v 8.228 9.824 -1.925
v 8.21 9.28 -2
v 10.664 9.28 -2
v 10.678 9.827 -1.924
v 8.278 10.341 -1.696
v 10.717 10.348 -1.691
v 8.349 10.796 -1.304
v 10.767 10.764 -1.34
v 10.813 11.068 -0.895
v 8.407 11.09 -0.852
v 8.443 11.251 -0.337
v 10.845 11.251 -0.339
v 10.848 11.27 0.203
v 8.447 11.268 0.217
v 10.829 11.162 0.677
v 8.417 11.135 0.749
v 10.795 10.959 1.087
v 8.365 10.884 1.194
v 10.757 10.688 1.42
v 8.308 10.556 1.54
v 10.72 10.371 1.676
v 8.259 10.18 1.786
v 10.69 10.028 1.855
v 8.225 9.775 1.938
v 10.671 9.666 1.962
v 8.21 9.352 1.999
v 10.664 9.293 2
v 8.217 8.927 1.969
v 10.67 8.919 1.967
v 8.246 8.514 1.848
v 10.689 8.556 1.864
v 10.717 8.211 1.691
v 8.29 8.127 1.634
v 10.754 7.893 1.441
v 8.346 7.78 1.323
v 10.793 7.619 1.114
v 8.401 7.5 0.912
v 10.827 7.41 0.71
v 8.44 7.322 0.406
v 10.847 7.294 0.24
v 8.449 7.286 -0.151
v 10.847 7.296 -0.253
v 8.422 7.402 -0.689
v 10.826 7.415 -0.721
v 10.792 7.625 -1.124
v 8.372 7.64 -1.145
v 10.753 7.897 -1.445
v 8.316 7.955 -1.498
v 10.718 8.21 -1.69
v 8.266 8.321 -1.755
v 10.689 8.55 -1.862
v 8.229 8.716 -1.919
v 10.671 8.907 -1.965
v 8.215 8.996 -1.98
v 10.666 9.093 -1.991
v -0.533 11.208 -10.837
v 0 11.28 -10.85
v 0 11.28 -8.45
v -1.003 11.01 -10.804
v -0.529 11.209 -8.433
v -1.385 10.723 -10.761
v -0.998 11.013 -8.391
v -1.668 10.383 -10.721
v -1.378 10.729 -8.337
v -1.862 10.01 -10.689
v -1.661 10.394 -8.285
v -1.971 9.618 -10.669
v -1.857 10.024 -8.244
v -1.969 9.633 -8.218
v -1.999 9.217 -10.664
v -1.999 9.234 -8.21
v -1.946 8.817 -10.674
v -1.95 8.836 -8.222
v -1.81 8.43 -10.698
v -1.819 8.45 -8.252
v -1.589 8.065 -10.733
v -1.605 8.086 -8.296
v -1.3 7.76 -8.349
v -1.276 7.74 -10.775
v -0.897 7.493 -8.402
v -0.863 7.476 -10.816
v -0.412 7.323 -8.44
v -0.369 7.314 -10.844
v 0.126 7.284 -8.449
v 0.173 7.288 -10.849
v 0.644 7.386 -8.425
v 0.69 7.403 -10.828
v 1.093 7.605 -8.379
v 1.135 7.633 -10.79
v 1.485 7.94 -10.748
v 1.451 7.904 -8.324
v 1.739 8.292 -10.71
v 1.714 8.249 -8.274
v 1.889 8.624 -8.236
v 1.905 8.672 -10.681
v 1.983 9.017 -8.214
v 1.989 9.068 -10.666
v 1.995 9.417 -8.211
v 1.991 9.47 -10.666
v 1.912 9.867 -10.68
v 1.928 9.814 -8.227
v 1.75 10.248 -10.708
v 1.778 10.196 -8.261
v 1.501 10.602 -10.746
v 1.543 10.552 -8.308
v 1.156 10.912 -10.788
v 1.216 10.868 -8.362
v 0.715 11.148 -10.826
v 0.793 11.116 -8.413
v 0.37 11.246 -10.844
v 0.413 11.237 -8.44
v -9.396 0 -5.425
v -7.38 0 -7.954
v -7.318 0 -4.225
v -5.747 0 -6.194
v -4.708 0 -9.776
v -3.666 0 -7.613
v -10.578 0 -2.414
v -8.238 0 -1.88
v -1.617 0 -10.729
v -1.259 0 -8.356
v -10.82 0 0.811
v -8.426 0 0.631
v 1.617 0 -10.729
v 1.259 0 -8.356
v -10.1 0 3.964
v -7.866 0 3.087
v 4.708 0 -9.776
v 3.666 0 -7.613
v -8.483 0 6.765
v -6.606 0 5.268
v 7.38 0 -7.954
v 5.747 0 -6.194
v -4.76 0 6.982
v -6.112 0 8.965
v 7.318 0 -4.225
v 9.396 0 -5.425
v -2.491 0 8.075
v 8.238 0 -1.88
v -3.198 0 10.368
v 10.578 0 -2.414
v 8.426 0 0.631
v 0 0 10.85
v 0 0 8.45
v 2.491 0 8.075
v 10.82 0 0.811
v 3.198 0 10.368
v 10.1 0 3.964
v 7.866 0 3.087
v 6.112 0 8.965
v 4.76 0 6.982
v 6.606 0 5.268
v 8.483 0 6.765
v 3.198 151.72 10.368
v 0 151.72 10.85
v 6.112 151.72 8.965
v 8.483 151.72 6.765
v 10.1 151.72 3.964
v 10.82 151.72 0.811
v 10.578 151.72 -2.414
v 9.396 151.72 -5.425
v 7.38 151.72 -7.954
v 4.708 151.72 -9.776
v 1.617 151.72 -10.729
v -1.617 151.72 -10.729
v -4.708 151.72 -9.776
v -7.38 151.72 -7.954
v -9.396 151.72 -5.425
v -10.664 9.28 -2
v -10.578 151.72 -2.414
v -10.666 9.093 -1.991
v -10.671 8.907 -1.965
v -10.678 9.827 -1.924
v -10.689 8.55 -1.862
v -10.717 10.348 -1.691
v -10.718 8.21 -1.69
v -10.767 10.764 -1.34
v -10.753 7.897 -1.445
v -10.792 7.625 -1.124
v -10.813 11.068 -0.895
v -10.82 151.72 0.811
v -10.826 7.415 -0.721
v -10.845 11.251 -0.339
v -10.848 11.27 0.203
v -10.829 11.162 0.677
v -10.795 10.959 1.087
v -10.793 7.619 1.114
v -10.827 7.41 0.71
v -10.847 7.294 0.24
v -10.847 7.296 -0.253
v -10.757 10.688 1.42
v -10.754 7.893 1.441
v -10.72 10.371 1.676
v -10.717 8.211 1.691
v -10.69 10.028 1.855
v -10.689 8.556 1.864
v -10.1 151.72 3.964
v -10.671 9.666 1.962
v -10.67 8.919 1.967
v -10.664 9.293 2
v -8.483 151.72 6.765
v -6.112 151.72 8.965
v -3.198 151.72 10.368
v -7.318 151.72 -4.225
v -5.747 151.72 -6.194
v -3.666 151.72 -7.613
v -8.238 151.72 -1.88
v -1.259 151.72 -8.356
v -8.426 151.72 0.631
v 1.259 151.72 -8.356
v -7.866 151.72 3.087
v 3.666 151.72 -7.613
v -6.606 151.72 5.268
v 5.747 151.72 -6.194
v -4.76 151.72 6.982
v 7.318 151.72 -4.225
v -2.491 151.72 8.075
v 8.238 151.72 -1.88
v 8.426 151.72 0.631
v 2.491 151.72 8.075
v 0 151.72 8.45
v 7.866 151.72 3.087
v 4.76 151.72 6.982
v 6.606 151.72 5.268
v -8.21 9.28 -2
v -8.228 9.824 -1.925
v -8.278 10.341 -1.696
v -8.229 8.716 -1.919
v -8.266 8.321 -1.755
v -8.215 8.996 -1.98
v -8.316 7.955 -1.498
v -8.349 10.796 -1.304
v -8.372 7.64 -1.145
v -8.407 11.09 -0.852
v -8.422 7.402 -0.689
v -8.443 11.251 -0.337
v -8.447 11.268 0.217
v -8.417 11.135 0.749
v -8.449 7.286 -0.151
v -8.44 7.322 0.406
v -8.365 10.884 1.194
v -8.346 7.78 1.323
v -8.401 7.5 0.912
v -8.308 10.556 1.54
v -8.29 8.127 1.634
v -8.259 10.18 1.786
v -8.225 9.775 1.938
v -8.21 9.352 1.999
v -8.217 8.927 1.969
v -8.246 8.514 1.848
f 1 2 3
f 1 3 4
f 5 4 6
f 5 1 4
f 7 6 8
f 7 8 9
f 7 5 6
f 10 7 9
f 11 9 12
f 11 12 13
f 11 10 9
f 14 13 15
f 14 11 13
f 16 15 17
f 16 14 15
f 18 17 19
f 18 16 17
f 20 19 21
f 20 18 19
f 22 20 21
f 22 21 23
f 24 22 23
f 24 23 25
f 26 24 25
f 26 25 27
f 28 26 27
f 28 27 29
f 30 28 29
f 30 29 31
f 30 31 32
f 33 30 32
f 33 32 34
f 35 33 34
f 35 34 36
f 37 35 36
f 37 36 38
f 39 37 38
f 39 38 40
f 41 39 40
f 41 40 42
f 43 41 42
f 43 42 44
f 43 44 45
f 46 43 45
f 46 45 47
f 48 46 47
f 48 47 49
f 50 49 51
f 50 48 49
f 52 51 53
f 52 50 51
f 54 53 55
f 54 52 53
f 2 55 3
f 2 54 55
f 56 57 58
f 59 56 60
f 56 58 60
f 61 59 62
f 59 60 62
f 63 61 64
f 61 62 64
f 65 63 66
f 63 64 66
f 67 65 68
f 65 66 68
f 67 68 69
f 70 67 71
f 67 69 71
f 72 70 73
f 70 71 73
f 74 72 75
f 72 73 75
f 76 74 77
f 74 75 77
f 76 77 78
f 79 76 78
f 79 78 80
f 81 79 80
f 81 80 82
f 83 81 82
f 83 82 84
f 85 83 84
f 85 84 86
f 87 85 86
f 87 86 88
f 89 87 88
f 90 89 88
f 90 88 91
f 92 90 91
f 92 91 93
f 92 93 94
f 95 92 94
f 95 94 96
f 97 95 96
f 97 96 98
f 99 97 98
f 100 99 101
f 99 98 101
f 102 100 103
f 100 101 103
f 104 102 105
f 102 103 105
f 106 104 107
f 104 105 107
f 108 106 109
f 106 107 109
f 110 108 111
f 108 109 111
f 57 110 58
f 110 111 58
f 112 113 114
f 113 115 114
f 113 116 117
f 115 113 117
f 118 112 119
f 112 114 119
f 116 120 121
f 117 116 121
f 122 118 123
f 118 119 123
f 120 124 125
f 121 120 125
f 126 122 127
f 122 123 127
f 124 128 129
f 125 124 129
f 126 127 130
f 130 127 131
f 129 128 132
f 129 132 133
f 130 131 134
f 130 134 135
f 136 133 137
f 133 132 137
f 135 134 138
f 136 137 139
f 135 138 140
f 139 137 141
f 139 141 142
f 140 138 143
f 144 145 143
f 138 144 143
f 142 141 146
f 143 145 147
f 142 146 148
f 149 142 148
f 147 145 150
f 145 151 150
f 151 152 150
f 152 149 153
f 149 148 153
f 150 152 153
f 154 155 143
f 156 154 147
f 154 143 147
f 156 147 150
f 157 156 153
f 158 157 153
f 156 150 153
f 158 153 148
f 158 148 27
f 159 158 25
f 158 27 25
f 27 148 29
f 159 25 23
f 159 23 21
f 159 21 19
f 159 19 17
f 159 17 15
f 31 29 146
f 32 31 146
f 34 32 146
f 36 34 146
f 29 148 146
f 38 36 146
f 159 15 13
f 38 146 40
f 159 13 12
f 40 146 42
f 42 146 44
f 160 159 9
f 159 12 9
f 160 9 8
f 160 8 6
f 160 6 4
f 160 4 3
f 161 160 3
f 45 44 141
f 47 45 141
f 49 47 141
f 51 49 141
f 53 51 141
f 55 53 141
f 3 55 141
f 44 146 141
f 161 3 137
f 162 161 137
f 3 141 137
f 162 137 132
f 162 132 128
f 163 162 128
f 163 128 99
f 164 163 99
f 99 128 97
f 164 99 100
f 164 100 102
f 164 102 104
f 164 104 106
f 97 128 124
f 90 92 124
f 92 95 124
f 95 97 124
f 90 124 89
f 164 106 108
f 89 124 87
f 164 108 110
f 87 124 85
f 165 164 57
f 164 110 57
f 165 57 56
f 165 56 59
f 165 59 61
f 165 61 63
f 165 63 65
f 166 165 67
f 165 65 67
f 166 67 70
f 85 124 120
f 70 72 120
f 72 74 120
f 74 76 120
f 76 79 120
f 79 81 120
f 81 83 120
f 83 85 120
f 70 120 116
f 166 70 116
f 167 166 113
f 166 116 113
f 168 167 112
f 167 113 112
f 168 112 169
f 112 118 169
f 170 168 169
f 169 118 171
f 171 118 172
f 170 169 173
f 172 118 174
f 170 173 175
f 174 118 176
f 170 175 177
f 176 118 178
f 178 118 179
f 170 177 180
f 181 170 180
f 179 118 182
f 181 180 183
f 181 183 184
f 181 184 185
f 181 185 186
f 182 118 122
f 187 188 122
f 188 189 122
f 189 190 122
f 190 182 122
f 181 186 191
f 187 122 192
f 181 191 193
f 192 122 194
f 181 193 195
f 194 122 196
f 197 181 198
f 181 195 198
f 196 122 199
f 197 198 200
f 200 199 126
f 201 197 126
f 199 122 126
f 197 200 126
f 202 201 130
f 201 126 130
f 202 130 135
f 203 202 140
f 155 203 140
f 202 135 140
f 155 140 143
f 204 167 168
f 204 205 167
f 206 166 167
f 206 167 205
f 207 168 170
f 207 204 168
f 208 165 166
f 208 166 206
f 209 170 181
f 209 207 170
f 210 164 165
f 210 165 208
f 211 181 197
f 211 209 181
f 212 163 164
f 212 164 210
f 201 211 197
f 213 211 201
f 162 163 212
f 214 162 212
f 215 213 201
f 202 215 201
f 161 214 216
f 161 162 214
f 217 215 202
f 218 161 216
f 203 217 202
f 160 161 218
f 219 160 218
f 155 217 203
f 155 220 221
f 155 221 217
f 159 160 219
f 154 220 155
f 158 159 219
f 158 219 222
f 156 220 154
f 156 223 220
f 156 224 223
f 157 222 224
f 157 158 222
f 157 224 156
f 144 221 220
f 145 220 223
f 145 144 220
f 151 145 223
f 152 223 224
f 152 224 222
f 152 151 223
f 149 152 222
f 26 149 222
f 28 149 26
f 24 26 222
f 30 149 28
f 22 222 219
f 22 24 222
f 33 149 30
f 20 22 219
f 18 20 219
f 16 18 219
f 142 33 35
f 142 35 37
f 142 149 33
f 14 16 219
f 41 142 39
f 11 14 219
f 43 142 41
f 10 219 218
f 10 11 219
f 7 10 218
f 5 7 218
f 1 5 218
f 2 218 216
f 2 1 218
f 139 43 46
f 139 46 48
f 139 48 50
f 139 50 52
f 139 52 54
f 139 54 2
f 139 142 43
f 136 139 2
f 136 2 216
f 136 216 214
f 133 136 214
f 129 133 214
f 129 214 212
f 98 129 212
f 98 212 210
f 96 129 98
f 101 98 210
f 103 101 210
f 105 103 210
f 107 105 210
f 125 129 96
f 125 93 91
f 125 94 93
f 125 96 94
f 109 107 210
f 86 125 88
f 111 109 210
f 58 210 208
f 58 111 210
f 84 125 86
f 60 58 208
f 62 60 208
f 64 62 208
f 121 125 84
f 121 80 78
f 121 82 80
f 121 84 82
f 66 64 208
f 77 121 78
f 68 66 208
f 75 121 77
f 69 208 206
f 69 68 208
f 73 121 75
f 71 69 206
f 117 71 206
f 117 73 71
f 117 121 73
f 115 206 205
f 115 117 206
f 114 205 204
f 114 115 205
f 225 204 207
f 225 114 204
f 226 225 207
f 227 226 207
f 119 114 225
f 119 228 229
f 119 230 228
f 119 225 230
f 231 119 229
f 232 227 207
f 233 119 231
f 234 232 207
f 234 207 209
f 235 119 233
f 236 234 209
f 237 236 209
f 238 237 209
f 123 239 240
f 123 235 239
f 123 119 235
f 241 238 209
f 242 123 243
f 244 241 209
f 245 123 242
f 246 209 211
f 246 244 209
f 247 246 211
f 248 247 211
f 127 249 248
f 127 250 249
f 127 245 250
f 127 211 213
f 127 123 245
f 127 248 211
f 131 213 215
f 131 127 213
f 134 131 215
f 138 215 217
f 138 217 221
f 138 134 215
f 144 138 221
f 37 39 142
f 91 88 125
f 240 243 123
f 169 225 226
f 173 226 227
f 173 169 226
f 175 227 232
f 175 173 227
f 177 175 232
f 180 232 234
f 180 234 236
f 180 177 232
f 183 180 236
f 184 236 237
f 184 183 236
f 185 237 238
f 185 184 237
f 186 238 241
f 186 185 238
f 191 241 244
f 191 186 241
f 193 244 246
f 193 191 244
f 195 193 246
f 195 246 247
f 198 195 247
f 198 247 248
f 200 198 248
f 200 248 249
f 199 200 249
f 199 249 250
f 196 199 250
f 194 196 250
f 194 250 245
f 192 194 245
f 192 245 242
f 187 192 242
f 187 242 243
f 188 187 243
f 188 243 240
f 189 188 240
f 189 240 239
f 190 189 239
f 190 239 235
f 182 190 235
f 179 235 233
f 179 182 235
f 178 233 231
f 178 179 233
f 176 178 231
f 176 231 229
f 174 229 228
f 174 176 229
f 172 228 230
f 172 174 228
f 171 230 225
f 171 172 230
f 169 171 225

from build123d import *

# Parameters (mm, degrees)
SKETCH1_R               = 10.85
SKETCH1_R_2             = 8.45
BOSS_EXTRUDE1_DEPTH     = 151.72
SKETCH3_R               = 2
CUT_EXTRUDE2_DEPTH      = 153.493945454
CUT_EXTRUDE3_DEPTH      = 153.493945567
CUT_EXTRUDE3_DEPTH_BACK = 153.493945567
SKETCH4_R               = 2


with BuildPart() as part:
    # Sketch1 → Boss-Extrude1 (new body)
    with BuildSketch(Plane(origin=(0, 0, 0), x_dir=(1, 0, 0), z_dir=(0, 1, 0))):
        with Locations(Location((0, 0, 0), (0, 0, 270))):
            Circle(SKETCH1_R)
        with Locations(Location((0, 0, 0), (0, 0, 270))):
            Circle(SKETCH1_R_2, mode=Mode.SUBTRACT)
    extrude(amount=BOSS_EXTRUDE1_DEPTH)

    # Sketch3 → Cut-Extrude2 (cut, through all)
    with BuildSketch(Plane.XY):
        with Locations(Location((0, 9.28, 0), (0, 0, 90))):
            Circle(SKETCH3_R)
    extrude(amount=-CUT_EXTRUDE2_DEPTH, mode=Mode.SUBTRACT)

    # Sketch4 → Cut-Extrude3 (cut, two sides: drawn at the far end of the back side and taken through both)
    with BuildSketch(Plane(origin=(0, 0, 0), x_dir=(0, 0, -1), z_dir=(1, 0, 0)).offset(-CUT_EXTRUDE3_DEPTH_BACK)):
        with Locations((0, 9.28)):
            Circle(SKETCH4_R)
    extrude(amount=CUT_EXTRUDE3_DEPTH + CUT_EXTRUDE3_DEPTH_BACK, mode=Mode.SUBTRACT)


solid = part.part
